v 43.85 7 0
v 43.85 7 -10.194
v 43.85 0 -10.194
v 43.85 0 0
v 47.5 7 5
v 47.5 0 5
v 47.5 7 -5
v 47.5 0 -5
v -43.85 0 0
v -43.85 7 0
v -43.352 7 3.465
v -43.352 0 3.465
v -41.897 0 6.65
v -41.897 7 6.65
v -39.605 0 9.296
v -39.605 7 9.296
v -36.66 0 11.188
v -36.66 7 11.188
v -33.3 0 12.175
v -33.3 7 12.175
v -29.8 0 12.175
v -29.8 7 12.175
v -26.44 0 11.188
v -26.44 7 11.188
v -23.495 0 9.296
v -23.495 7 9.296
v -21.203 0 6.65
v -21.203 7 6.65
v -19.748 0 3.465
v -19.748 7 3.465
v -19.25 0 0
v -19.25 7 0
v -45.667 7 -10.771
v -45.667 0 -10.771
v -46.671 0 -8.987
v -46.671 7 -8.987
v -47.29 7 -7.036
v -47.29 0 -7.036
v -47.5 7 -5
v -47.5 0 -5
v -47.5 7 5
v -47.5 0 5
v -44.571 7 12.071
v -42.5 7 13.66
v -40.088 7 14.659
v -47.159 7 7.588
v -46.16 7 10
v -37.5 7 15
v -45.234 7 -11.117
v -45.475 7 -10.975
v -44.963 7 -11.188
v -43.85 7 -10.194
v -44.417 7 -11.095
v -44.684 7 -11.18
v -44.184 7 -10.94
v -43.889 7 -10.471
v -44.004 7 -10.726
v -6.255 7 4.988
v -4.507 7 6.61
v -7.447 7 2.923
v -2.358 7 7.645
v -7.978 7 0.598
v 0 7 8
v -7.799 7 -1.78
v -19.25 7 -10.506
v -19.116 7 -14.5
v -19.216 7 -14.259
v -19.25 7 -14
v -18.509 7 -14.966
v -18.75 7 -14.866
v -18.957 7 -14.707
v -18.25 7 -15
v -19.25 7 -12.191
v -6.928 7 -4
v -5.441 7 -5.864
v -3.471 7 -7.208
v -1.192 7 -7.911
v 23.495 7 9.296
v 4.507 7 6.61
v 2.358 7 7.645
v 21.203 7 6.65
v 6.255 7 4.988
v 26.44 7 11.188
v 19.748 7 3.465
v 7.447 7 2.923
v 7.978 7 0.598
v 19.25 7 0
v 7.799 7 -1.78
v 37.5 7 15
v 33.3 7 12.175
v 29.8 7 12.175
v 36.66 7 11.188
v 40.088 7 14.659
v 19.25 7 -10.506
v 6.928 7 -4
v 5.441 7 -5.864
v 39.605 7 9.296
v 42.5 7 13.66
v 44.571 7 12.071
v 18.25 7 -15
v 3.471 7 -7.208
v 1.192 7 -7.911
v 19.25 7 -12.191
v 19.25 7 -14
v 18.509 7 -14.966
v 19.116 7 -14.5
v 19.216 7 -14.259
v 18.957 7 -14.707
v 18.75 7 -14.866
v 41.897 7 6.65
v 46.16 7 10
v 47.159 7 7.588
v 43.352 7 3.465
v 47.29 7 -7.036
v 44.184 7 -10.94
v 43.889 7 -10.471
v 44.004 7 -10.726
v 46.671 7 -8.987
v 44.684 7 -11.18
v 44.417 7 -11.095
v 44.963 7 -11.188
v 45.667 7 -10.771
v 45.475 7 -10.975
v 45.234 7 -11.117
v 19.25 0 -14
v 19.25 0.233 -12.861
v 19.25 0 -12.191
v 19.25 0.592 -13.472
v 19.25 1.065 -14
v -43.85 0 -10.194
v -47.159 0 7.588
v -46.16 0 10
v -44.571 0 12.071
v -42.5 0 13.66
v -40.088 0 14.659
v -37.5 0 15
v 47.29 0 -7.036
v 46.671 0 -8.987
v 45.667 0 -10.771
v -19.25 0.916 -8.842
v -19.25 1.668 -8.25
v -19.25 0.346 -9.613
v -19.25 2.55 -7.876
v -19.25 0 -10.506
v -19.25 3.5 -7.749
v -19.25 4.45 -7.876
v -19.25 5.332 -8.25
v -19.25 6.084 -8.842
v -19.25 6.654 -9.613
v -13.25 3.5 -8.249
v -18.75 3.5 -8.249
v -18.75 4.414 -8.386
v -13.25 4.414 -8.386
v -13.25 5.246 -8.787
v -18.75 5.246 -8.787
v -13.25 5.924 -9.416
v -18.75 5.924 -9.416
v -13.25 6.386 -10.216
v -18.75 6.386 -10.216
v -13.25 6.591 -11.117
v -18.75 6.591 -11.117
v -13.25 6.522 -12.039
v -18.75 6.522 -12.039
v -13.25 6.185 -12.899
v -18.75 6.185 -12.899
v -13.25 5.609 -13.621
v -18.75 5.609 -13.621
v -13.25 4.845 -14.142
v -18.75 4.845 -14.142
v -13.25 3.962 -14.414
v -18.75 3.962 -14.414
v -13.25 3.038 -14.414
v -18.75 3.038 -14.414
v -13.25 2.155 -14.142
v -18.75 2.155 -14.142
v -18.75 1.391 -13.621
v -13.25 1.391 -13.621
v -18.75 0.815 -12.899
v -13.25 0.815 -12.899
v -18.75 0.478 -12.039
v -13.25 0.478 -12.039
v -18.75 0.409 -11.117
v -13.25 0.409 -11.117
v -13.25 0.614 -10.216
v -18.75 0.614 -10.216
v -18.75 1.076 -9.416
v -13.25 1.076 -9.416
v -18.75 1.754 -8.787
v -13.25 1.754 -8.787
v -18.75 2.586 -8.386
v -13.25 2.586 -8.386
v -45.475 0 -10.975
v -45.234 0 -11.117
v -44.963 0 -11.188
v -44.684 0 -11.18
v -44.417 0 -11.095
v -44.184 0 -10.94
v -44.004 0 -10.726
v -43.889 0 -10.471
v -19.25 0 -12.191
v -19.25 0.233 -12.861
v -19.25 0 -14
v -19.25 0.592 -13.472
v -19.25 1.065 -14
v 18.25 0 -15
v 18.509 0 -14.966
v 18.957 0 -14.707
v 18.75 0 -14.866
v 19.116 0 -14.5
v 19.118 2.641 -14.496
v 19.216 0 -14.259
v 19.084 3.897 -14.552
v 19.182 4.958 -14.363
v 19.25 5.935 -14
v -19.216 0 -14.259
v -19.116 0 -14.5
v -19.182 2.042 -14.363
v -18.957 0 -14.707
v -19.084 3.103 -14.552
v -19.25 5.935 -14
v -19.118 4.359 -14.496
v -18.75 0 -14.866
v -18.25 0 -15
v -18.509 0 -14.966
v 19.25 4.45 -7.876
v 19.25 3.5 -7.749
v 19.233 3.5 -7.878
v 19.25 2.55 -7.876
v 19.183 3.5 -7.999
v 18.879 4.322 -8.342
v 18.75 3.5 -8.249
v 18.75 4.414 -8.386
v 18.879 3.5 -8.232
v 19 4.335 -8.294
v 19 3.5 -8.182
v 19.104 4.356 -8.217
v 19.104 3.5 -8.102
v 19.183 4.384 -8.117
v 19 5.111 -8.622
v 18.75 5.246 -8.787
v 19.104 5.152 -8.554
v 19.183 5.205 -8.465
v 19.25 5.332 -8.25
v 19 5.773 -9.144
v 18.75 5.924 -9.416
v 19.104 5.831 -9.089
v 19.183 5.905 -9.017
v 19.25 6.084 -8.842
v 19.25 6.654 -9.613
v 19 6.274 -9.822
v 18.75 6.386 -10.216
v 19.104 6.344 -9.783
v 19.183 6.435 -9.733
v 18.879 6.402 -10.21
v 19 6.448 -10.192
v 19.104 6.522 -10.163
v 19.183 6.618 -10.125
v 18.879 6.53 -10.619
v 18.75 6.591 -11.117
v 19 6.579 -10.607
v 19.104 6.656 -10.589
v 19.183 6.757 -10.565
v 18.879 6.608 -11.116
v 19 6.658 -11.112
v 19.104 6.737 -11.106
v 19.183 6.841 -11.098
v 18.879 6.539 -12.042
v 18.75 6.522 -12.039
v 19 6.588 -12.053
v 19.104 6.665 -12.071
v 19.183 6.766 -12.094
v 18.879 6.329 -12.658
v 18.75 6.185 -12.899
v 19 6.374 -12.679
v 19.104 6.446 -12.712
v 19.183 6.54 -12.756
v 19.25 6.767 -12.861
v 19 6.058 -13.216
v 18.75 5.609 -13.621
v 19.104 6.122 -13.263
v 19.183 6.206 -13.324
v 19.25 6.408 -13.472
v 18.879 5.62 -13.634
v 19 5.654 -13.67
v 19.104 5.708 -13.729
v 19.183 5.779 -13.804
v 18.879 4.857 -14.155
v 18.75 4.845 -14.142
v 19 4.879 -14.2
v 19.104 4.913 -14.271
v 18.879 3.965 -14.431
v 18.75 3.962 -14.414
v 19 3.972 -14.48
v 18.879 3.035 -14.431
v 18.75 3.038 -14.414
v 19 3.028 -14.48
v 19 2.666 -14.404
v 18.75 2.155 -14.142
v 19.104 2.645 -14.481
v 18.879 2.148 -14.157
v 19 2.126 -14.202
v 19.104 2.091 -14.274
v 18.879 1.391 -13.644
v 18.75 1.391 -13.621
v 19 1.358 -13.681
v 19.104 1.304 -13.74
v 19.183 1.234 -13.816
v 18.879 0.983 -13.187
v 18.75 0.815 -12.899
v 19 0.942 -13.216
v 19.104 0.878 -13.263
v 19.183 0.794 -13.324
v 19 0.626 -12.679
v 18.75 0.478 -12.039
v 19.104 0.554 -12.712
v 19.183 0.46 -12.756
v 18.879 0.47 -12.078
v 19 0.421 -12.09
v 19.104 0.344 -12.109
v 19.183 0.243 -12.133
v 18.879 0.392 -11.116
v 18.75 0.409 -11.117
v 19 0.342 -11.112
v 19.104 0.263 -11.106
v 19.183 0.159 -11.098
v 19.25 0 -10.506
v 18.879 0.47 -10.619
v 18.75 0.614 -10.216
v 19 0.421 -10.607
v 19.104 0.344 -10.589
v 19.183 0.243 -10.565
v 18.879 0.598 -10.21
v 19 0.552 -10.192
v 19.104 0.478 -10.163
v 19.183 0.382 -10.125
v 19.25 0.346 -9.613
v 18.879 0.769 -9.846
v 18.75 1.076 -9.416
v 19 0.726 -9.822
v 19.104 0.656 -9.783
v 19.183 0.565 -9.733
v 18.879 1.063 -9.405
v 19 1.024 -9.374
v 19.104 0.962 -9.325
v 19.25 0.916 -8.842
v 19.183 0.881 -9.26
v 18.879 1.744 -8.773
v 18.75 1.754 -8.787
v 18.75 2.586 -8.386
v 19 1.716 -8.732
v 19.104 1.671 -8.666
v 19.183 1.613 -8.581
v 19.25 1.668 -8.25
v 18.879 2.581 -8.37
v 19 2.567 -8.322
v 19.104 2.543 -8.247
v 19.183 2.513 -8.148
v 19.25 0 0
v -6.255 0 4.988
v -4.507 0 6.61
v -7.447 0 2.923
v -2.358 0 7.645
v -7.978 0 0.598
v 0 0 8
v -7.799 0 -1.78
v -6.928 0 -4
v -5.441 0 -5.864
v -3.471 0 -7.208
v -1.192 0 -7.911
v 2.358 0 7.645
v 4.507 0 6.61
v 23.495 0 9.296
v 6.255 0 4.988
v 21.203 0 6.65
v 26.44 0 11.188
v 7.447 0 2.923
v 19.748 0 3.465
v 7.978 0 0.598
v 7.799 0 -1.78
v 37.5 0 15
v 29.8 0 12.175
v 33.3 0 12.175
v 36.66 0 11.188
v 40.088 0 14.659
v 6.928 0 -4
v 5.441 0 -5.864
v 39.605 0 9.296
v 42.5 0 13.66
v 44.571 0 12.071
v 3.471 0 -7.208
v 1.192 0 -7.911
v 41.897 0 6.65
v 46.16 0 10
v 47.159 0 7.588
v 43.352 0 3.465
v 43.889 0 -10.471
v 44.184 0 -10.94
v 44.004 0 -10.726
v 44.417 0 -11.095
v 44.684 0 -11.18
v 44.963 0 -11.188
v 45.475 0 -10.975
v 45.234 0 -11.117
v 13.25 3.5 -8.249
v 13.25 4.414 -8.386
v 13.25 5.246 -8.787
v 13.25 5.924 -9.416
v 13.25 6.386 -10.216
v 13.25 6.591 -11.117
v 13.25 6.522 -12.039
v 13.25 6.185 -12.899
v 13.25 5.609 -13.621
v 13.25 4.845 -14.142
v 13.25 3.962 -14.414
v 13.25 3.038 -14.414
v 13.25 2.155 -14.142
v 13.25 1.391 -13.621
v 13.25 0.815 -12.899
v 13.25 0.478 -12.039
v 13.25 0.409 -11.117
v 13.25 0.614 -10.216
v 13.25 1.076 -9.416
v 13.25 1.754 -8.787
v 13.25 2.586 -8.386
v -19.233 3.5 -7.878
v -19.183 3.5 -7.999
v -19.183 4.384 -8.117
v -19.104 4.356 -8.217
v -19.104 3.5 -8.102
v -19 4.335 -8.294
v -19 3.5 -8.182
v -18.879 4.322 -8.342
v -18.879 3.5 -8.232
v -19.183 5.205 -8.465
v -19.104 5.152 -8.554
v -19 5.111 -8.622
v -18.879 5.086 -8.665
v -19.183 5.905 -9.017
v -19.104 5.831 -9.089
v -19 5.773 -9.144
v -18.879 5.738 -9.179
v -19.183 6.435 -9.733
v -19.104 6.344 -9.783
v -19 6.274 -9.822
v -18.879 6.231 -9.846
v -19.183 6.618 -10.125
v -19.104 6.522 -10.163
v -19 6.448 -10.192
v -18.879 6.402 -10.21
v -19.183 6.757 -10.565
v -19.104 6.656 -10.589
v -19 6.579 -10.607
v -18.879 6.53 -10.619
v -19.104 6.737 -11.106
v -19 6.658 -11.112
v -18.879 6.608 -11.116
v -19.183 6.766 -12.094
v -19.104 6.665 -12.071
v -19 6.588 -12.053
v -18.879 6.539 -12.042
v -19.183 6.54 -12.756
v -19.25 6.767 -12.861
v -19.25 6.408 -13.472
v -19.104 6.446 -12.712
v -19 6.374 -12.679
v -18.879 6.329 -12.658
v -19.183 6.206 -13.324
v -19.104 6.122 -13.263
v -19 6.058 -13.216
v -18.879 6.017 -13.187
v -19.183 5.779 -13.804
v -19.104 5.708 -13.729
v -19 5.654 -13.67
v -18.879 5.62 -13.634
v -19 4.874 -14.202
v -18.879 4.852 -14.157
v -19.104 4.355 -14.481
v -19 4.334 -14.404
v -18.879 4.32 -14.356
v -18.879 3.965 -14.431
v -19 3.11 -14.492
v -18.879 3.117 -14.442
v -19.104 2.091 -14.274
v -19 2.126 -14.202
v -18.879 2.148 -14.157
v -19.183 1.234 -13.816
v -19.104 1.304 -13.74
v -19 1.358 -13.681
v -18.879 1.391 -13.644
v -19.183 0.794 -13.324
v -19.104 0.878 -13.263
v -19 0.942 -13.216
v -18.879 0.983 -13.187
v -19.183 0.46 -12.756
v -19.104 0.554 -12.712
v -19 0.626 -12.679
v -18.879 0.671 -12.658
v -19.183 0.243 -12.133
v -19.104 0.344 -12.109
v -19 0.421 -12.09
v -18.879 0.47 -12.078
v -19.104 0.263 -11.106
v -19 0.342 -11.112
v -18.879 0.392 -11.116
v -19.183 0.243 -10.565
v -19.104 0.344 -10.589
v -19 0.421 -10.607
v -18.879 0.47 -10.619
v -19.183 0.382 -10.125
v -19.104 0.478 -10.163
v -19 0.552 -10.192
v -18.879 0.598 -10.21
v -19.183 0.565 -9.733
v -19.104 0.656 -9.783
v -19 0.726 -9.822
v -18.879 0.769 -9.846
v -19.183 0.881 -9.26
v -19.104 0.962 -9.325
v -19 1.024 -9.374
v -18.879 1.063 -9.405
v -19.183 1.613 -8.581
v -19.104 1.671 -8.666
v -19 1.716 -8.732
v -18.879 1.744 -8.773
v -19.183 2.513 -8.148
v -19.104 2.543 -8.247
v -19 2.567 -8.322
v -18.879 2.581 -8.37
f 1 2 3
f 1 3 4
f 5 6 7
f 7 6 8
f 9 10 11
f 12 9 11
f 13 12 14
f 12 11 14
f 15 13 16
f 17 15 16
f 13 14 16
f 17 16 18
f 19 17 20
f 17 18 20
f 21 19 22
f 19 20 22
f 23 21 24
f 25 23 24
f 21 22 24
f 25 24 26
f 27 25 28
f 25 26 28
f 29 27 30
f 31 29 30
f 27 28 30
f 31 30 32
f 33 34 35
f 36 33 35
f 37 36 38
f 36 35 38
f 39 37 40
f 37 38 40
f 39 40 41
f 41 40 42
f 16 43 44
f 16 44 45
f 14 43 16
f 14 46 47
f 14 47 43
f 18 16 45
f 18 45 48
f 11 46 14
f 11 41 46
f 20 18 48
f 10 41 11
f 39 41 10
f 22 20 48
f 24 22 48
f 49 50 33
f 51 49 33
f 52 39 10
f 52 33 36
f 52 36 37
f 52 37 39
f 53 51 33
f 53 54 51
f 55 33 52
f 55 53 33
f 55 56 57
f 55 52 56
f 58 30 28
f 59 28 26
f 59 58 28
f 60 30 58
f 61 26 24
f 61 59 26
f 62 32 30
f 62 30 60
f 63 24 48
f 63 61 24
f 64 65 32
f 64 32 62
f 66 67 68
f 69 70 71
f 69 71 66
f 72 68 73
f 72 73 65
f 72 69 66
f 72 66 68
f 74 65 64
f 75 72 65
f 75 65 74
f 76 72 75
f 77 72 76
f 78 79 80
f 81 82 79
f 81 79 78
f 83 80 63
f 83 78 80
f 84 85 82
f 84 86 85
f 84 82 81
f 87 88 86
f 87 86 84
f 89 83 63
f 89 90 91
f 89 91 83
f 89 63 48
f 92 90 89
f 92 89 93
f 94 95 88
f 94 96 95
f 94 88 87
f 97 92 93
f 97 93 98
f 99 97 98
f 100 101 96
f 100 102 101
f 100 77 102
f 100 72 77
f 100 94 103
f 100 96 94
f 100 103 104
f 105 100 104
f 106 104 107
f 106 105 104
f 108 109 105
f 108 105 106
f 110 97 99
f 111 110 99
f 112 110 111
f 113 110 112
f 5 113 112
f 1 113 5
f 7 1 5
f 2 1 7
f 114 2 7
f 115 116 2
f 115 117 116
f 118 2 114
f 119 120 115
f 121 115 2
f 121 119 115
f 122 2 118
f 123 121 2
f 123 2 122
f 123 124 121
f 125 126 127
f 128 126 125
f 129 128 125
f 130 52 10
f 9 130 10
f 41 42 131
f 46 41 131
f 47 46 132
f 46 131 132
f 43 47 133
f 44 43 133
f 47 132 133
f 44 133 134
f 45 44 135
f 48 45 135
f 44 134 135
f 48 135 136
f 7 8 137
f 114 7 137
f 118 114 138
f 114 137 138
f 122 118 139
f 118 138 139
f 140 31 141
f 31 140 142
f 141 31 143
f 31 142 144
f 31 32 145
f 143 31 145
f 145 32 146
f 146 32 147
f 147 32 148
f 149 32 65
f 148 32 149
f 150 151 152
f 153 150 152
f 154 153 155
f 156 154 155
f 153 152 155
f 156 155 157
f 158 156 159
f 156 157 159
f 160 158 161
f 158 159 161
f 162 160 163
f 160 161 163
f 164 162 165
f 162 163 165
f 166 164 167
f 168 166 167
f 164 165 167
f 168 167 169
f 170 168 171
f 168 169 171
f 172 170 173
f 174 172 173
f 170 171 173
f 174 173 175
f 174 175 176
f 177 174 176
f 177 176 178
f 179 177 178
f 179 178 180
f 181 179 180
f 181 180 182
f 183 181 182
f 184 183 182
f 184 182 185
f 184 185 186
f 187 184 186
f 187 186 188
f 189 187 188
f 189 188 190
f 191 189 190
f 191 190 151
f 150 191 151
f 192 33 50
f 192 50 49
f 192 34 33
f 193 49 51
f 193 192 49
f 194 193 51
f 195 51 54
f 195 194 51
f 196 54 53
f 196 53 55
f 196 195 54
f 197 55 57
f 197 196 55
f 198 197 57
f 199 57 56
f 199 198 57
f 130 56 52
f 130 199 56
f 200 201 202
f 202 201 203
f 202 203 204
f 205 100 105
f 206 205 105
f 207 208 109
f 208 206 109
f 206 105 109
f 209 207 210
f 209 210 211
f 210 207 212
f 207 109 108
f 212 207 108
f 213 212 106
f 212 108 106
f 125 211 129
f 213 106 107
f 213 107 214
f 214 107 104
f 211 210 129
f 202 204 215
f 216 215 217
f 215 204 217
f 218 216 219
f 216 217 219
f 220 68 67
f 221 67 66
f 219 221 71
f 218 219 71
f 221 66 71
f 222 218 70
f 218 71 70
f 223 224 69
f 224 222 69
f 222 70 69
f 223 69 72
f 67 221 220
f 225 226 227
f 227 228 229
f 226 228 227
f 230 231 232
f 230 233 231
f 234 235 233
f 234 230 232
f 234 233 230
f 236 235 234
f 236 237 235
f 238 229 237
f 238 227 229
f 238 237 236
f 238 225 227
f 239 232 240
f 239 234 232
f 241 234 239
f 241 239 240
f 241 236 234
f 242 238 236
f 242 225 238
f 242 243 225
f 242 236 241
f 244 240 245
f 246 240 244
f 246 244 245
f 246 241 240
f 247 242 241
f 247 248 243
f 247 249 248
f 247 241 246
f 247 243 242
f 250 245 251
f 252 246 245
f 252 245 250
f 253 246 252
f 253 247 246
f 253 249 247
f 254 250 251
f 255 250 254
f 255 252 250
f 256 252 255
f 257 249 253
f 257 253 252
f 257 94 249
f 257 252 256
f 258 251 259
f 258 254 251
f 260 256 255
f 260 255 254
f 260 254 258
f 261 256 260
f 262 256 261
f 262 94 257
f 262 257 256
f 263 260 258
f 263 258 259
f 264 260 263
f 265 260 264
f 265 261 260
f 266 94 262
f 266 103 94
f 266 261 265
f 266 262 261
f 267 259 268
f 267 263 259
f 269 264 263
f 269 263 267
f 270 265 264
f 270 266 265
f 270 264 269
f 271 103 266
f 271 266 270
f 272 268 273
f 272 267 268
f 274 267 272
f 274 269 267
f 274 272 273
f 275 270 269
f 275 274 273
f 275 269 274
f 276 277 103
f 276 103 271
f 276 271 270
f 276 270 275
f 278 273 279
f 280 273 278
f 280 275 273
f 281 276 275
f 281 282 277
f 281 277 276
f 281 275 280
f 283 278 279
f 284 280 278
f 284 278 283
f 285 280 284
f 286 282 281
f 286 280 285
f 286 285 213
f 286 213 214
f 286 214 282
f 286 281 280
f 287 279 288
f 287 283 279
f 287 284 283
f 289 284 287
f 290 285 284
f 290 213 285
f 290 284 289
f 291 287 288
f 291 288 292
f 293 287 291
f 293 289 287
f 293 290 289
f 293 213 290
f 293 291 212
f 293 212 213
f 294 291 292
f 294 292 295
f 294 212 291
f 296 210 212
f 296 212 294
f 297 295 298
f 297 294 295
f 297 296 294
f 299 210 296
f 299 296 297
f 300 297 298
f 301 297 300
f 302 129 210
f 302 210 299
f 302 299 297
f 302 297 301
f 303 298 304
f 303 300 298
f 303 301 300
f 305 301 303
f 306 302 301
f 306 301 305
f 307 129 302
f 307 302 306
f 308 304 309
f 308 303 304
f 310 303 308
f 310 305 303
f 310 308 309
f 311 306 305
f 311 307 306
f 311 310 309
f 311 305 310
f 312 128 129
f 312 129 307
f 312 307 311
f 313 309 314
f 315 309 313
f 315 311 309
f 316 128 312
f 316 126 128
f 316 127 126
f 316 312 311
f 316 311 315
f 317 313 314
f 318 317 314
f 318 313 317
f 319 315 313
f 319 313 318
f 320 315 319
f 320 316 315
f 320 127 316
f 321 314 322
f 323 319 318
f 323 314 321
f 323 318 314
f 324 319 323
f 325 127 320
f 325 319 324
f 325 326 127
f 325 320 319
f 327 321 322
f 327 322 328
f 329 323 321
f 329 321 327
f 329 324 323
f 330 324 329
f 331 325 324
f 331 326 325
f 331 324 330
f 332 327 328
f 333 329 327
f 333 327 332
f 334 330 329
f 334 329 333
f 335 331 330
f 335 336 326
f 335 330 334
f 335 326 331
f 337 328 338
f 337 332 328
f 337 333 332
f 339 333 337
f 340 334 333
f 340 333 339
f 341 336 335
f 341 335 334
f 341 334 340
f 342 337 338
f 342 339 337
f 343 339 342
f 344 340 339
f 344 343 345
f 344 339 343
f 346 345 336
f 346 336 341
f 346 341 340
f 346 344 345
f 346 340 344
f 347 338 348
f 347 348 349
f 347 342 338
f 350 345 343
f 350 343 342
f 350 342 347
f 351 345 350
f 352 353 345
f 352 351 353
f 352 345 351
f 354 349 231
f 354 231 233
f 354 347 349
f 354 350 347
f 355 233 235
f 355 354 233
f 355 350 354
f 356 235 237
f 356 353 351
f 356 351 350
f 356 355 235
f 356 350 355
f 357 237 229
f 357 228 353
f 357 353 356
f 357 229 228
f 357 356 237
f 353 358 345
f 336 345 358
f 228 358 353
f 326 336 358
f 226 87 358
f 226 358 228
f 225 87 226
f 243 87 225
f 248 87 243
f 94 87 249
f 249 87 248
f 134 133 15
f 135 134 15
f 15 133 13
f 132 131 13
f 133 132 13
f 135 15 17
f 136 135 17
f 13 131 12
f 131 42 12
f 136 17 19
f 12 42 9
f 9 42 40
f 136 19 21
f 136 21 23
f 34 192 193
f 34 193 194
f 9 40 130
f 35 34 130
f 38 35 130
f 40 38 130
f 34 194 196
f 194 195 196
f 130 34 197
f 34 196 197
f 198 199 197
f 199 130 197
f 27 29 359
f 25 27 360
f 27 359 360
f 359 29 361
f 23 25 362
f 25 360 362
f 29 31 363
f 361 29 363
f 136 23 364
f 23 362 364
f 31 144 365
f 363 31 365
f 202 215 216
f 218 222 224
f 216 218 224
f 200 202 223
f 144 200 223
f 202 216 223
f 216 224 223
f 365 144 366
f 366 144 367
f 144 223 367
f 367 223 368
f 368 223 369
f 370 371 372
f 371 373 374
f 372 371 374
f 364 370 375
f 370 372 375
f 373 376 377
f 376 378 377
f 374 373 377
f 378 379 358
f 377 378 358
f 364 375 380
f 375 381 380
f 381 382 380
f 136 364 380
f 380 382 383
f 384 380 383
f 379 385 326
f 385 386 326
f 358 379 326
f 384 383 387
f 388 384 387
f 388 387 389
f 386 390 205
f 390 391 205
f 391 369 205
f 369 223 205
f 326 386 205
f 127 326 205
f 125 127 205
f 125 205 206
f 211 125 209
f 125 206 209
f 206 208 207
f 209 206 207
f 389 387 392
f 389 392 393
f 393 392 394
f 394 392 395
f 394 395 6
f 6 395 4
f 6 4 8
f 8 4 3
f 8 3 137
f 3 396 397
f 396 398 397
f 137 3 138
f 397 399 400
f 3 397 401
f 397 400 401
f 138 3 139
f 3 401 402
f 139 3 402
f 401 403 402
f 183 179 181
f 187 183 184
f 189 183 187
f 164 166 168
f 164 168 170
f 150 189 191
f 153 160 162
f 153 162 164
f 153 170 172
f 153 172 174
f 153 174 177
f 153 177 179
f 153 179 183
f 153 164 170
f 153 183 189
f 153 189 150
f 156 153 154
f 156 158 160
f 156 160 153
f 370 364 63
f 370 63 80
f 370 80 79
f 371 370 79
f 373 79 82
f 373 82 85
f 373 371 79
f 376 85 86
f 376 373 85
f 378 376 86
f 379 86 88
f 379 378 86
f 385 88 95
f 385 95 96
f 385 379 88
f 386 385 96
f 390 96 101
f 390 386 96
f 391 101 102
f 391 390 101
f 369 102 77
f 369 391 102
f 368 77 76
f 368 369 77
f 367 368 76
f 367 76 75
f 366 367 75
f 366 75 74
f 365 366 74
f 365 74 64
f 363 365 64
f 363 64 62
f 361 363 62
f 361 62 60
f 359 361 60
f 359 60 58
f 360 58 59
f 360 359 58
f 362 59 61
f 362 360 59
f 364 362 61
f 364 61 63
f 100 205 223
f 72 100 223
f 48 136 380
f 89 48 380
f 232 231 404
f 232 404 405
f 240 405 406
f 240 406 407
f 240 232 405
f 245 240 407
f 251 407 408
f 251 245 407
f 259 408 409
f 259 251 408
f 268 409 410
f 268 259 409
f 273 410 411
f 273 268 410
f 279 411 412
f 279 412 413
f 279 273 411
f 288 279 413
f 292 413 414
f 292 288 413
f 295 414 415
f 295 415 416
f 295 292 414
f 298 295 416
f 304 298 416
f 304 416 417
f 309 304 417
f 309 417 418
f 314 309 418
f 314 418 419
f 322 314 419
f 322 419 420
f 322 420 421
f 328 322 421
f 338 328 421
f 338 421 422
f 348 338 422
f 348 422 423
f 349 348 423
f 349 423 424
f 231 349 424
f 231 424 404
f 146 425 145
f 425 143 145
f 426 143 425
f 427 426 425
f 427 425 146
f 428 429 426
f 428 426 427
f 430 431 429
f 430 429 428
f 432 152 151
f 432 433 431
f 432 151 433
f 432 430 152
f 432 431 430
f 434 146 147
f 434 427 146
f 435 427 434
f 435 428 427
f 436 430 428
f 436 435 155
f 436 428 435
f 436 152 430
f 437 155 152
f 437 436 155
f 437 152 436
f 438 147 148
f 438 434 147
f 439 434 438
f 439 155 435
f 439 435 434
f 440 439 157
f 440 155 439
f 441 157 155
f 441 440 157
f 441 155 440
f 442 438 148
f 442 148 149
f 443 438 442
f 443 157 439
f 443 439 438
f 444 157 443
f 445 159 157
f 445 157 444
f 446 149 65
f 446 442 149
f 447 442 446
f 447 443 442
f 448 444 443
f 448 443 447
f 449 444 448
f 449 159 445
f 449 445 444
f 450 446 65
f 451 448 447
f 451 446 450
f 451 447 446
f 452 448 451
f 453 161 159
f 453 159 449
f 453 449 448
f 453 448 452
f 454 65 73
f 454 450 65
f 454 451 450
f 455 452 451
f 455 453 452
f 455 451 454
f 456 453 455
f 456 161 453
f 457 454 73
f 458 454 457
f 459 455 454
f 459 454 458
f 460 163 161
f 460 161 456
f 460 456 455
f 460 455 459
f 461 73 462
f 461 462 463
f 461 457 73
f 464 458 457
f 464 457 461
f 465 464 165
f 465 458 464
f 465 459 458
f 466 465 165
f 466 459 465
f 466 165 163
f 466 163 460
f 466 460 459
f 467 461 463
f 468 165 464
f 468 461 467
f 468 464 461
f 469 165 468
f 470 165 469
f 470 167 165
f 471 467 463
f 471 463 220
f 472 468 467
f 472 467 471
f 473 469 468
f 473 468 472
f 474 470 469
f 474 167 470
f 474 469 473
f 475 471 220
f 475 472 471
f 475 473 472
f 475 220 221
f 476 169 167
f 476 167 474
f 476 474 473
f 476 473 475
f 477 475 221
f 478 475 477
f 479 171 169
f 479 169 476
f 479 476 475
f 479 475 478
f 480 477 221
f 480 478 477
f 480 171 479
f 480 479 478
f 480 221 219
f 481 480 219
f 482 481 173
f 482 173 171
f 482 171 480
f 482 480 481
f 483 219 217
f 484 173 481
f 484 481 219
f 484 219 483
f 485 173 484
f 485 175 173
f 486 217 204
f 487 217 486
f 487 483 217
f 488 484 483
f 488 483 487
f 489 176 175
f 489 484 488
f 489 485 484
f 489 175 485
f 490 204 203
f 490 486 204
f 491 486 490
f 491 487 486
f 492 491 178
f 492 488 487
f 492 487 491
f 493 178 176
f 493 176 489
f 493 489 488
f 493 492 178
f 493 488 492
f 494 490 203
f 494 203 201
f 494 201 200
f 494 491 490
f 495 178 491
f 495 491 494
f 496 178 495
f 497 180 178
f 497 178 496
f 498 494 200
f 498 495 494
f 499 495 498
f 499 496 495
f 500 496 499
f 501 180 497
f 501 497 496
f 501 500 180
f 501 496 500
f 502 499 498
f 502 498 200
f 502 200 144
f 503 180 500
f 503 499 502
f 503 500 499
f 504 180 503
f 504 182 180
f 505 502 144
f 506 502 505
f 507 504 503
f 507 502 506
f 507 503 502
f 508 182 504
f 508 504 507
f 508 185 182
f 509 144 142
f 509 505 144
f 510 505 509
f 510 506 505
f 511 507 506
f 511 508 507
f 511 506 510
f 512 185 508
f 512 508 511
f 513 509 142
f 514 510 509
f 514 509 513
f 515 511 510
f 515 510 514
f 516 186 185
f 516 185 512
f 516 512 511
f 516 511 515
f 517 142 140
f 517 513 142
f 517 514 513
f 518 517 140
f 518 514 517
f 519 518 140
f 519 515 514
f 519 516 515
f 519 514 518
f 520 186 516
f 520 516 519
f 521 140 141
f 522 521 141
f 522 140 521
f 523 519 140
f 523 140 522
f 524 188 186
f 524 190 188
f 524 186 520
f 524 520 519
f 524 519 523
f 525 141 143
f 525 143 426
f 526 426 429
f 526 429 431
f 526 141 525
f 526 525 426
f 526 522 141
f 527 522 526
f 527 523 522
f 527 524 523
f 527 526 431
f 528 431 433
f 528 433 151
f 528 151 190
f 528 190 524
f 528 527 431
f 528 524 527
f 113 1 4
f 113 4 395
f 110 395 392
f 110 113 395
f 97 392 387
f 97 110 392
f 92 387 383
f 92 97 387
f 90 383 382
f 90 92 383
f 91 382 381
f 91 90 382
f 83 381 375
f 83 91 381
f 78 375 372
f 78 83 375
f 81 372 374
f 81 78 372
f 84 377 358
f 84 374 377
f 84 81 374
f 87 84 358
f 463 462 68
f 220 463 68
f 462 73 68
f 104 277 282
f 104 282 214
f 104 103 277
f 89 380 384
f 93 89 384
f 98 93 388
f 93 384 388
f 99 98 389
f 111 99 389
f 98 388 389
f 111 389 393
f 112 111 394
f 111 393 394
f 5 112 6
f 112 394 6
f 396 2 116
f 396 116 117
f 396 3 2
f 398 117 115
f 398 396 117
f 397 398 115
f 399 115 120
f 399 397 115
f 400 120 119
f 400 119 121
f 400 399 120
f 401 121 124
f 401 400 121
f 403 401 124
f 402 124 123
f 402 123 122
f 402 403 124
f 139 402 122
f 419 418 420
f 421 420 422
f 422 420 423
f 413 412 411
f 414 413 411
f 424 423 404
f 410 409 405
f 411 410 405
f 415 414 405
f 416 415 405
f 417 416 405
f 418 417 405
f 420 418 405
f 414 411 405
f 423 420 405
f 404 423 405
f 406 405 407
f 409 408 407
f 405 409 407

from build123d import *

# Parameters (mm, degrees)
SKETCH1_R           = 8
BOSS_EXTRUDE1_DEPTH = 7
CUT_EXTRUDE1_DEPTH  = 10
SKETCH3_R           = 3.1
CUT_EXTRUDE2_DEPTH  = 6
FILLET1_R           = 0.5
FILLET2_R           = 1
FILLET3_R           = 1
FILLET5_R           = 1
FILLET6_R           = 0.5
FILLET7_R           = 1


with BuildPart() as part:
    # Sketch1 → Boss-Extrude1 (new body)
    with BuildSketch(Plane(origin=(0, 0, 0), x_dir=(1, 0, 0), z_dir=(0, 1, 0))):
        with BuildLine():
            Line((-37.5, -15), (37.5, -15))
            ThreePointArc((37.5, -15), (44.571067812, -12.071067812), (47.5, -5))
            Line((47.5, -5), (47.5, 5))
            ThreePointArc((47.5, 5), (44.571067812, 12.071067812), (37.5, 15))
            Line((37.5, 15), (-37.5, 15))
            ThreePointArc((-37.5, 15), (-44.571067812, 12.071067812), (-47.5, 5))
            Line((-47.5, 5), (-47.5, -5))
            ThreePointArc((-47.5, -5), (-44.571067812, -12.071067812), (-37.5, -15))
        make_face()
        with Locations(Location((0, 0, 0), (0, 0, 270))):
            Circle(SKETCH1_R, mode=Mode.SUBTRACT)
    extrude(amount=BOSS_EXTRUDE1_DEPTH)

    # Sketch2 → Cut-Extrude1 (cut)
    with BuildSketch(Plane(origin=(0, 7, 0), x_dir=(1, 0, 0), z_dir=(0, 1, 0))):
        with BuildLine():
            Line((-19.25, 0), (-19.25, 15))
            Line((-19.25, 15), (-43.85, 15))
            Line((-43.85, 15), (-43.85, 0))
            ThreePointArc((-43.85, 0), (-31.55, -12.3), (-19.25, 0))
        make_face()
    cut_extrude1 = extrude(amount=-CUT_EXTRUDE1_DEPTH, mode=Mode.SUBTRACT)

    # Sketch3 → Cut-Extrude2 (cut)
    with BuildSketch(Plane.ZY.offset(19.25)):
        with Locations((-11.34873736, 3.5)):
            Circle(SKETCH3_R)
    cut_extrude2 = extrude(amount=-CUT_EXTRUDE2_DEPTH, mode=Mode.SUBTRACT)

    # Fillet1
    # the kernel refuses this fillet: 0.5 mm, written as the material it takes off along each edge
    with BuildSketch(Plane(origin=(-19.25, 3.5, -11.34873736), x_dir=(0, 0, 1), z_dir=(0, -1, 0))) as fillet1_piece_1:
        with BuildLine():
            CenterArc((3.1 + FILLET1_R, -FILLET1_R), FILLET1_R, 90, 90)
            Line((3.1, -FILLET1_R), (3.1, 0))
            Line((3.1, 0), (3.1 + FILLET1_R, 0))
        make_face()
    revolve(axis=Axis((-19.25, 3.5, -11.34873736), (-1, 0, 0)), mode=Mode.SUBTRACT)

    # Fillet2
    fillet2_edges = [part.edges().sort_by_distance(p)[0] for p in [
        (-43.85, 3.5, -12.725121358),
    ]]
    fillet(fillet2_edges, radius=FILLET2_R)

    # Fillet3
    # the kernel refuses this fillet: 1 mm, written as the material it takes off along each edge
    with BuildSketch(Plane(origin=(-19.25, 9.5, -15), x_dir=(0, 0, 1), z_dir=(0, -1, 0))) as fillet3_piece_1:
        with BuildLine():
            CenterArc((FILLET3_R, -FILLET3_R), FILLET3_R, 90, 90)
            Line((0, -FILLET3_R), (-FILLET3_R * 0.02, -FILLET3_R))
            Line((-FILLET3_R * 0.02, -FILLET3_R), (-FILLET3_R * 0.02, FILLET3_R * 0.02))
            Line((-FILLET3_R * 0.02, FILLET3_R * 0.02), (FILLET3_R, FILLET3_R * 0.02))
            Line((FILLET3_R, FILLET3_R * 0.02), (FILLET3_R, 0))
        make_face()
    extrude(amount=12, mode=Mode.SUBTRACT)

    # Mirror5: Cut-Extrude1, Cut-Extrude2 across plane
    add(cut_extrude1.mirror(Plane.ZY), mode=Mode.SUBTRACT)
    add(cut_extrude2.mirror(Plane.ZY), mode=Mode.SUBTRACT)

    # Fillet5
    fillet5_edges = [part.edges().sort_by_distance(p)[0] for p in [
        (43.85, 3.5, -12.725121358),
    ]]
    fillet(fillet5_edges, radius=FILLET5_R)

    # Fillet6
    # the kernel refuses this fillet: 0.5 mm, written as the material it takes off along each edge
    with BuildSketch(Plane(origin=(19.25, 3.5, -11.34873736), x_dir=(0, 0, 1), z_dir=(0, -1, 0))) as fillet6_piece_1:
        with BuildLine():
            CenterArc((3.1 + FILLET6_R, FILLET6_R), FILLET6_R, 180, 90)
            Line((3.1, FILLET6_R), (3.1, 0))
            Line((3.1, 0), (3.1 + FILLET6_R, 0))
        make_face()
    revolve(axis=Axis((19.25, 3.5, -11.34873736), (-1, 0, 0)), mode=Mode.SUBTRACT)

    # Fillet7
    # the kernel refuses this fillet: 1 mm, written as the material it takes off along each edge
    with BuildSketch(Plane(origin=(19.25, 9.5, -15), x_dir=(-1, 0, 0), z_dir=(0, -1, 0))) as fillet7_piece_1:
        with BuildLine():
            CenterArc((FILLET7_R, -FILLET7_R), FILLET7_R, 90, 90)
            Line((0, -FILLET7_R), (-FILLET7_R * 0.02, -FILLET7_R))
            Line((-FILLET7_R * 0.02, -FILLET7_R), (-FILLET7_R * 0.02, FILLET7_R * 0.02))
            Line((-FILLET7_R * 0.02, FILLET7_R * 0.02), (FILLET7_R, FILLET7_R * 0.02))
            Line((FILLET7_R, FILLET7_R * 0.02), (FILLET7_R, 0))
        make_face()
    extrude(amount=12, mode=Mode.SUBTRACT)


solid = part.part
